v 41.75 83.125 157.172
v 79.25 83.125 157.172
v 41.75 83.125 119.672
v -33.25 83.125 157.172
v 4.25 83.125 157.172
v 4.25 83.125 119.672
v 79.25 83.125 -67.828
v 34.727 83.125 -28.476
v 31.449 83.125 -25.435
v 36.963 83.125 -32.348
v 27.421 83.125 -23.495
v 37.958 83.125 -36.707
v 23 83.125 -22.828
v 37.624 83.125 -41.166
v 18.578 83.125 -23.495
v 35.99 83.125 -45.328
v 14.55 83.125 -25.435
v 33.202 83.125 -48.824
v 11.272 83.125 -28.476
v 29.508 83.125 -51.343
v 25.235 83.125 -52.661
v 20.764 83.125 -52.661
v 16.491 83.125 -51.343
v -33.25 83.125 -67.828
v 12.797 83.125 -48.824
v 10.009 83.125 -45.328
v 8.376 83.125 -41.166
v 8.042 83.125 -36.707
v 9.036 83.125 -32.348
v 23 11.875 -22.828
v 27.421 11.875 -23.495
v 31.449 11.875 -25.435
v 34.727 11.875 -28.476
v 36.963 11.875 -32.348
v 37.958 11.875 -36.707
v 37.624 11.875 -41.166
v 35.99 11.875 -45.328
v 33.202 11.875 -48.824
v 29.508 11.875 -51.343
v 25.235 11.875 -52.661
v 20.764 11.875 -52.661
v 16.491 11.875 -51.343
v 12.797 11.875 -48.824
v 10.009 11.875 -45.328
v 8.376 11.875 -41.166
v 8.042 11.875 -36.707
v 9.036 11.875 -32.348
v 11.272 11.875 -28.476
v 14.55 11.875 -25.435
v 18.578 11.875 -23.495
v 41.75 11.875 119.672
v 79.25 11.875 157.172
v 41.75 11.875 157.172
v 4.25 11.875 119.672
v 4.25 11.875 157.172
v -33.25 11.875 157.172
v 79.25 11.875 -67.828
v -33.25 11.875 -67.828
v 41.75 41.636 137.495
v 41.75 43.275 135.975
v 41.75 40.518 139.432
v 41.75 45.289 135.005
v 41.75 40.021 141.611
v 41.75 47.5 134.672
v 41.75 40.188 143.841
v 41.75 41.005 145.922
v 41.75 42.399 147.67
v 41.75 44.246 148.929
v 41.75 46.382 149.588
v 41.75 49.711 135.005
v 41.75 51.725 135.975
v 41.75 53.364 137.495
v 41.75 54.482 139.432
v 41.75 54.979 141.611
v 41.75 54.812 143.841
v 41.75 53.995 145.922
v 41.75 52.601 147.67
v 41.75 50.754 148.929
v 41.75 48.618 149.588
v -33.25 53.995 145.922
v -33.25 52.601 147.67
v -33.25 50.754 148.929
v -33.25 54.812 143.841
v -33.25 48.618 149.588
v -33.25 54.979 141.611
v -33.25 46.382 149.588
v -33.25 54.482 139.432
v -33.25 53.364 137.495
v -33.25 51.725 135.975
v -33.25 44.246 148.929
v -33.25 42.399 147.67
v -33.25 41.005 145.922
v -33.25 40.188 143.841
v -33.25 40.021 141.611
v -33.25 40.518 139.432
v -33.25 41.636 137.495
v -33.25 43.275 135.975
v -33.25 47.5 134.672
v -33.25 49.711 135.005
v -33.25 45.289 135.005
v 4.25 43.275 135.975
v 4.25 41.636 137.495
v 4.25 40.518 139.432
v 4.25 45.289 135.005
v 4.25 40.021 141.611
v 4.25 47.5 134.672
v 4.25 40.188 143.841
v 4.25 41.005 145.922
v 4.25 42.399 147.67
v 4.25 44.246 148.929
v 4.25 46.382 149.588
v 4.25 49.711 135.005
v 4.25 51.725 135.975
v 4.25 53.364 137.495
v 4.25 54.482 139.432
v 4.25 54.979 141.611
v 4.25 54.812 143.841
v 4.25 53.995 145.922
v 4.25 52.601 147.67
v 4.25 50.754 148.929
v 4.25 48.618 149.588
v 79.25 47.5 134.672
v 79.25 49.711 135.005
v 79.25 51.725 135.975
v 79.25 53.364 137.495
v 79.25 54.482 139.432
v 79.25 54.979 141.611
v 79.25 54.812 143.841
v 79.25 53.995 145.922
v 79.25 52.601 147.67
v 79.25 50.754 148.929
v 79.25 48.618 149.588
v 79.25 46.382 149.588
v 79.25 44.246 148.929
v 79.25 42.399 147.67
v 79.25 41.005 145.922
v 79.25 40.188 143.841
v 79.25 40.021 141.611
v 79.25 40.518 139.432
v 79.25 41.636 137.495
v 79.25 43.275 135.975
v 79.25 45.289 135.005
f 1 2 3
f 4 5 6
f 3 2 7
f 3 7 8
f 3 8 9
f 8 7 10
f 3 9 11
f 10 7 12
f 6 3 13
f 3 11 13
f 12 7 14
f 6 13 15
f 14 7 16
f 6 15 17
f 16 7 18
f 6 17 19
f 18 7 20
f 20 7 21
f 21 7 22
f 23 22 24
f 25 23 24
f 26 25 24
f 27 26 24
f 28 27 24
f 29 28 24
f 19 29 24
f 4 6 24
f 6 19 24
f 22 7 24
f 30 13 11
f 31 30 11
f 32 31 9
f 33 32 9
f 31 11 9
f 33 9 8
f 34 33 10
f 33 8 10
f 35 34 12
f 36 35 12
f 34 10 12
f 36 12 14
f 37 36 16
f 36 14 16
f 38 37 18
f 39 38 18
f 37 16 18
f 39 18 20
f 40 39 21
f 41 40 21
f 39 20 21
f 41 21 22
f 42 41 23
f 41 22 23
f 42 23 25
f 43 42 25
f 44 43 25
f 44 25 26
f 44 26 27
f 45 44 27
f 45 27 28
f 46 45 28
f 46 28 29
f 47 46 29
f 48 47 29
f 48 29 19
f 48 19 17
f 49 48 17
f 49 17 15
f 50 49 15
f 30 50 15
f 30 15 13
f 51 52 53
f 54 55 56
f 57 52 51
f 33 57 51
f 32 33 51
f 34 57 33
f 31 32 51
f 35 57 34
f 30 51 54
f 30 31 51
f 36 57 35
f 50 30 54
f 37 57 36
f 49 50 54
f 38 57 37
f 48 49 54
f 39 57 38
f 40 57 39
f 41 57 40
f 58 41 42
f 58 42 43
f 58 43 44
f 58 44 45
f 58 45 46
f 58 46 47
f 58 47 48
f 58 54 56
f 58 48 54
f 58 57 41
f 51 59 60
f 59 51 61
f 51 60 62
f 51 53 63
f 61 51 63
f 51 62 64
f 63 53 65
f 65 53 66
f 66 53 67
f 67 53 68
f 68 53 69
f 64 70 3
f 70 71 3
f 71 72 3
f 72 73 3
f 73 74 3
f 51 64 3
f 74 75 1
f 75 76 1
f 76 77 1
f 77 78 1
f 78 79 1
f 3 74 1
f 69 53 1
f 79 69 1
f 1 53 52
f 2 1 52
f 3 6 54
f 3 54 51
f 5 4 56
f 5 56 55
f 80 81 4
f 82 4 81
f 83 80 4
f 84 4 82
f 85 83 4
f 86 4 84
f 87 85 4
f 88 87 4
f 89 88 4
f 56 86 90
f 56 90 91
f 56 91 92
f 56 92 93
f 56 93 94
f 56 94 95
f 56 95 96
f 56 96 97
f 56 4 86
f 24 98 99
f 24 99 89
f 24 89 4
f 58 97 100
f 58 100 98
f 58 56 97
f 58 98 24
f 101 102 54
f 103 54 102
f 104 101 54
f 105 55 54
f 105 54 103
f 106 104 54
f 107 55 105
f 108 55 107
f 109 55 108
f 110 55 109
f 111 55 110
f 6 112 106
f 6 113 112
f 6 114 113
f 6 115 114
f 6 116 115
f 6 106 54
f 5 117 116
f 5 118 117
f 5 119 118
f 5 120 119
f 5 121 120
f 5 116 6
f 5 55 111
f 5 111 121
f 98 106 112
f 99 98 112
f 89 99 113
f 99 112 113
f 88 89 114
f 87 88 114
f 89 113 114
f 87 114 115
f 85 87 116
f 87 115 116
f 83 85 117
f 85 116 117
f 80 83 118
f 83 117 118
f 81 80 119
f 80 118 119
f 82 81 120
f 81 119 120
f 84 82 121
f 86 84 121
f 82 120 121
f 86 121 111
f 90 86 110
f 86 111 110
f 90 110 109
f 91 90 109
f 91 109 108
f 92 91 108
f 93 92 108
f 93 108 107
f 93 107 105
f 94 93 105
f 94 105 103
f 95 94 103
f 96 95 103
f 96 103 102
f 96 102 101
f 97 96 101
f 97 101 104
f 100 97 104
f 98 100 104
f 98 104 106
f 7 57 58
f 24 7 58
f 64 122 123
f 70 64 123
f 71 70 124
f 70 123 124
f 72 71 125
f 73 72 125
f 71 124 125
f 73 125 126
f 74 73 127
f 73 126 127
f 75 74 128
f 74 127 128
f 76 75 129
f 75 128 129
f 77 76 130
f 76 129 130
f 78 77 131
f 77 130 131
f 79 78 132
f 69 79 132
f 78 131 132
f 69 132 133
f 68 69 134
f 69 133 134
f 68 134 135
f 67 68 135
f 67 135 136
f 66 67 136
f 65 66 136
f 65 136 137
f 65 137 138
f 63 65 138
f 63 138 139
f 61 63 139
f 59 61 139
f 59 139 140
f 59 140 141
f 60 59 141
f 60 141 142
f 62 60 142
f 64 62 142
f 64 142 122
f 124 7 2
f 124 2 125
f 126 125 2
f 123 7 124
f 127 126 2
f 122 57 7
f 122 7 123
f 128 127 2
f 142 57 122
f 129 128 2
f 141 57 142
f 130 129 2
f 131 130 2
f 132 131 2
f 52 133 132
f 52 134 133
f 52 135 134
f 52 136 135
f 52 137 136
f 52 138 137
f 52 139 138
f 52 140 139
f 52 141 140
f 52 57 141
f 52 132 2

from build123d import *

# Parameters (mm, degrees)
BOSS_EXTRUDE1_DEPTH = 95
SKETCH3_R           = 20
CUT_EXTRUDE2_DEPTH  = 327
SKETCH4_R           = 10
CUT_EXTRUDE3_DEPTH  = 260
SKETCH5_W           = 50
SKETCH5_H           = 95.125248012
CUT_EXTRUDE4_DEPTH  = 50
SCALE1_SCALE        = 0.75


with BuildPart() as part:
    # Sketch1 → Boss-Extrude1 (new body)
    with BuildSketch(Plane(origin=(0, 0, 0), x_dir=(1, 0, 0), z_dir=(0, 1, 0))):
        Polygon((72.999601763, 104.000796475), (97.999601763, 104.000796475), (97.999601763, -195.999203525), (72.999601763, -195.999203525), (22.999601763, -195.999203525), (-52.000398237, -195.999203525), (-52.000398237, 104.000796475), (22.999601763, 104.000796475), align=None)
    extrude(amount=BOSS_EXTRUDE1_DEPTH)

    # Sketch3 → Cut-Extrude2 (cut)
    with BuildSketch(Plane(origin=(0, 95, 0), x_dir=(1, 0, 0), z_dir=(0, 1, 0))):
        with Locations(Location((22.999601763, 64.000796475, 0), (0, 0, 270))):
            Circle(SKETCH3_R)
    extrude(amount=-CUT_EXTRUDE2_DEPTH, mode=Mode.SUBTRACT)

    # Sketch4 → Cut-Extrude3 (cut)
    with BuildSketch(Plane(origin=(97.999601763, 0, 0), x_dir=(0, 0, -1), z_dir=(1, 0, 0))):
        with Locations((-175.999203525, 47.5)):
            Circle(SKETCH4_R)
    extrude(amount=-CUT_EXTRUDE3_DEPTH, mode=Mode.SUBTRACT)

    # Sketch5 → Cut-Extrude4 (cut)
    with BuildSketch(Plane.XY.offset(195.999203525)):
        with Locations((22.999601763, 47.562624006)):
            Rectangle(SKETCH5_W, SKETCH5_H)
    extrude(amount=-CUT_EXTRUDE4_DEPTH, mode=Mode.SUBTRACT)


with BuildPart() as part_1:
    # Scale1: scaled about (22.999601763, 47.5, 40.688864602)
    add(part.part.scale(SCALE1_SCALE).moved(Location((5.749900441, 11.875, 10.172216151))))


solid = part_1.part
